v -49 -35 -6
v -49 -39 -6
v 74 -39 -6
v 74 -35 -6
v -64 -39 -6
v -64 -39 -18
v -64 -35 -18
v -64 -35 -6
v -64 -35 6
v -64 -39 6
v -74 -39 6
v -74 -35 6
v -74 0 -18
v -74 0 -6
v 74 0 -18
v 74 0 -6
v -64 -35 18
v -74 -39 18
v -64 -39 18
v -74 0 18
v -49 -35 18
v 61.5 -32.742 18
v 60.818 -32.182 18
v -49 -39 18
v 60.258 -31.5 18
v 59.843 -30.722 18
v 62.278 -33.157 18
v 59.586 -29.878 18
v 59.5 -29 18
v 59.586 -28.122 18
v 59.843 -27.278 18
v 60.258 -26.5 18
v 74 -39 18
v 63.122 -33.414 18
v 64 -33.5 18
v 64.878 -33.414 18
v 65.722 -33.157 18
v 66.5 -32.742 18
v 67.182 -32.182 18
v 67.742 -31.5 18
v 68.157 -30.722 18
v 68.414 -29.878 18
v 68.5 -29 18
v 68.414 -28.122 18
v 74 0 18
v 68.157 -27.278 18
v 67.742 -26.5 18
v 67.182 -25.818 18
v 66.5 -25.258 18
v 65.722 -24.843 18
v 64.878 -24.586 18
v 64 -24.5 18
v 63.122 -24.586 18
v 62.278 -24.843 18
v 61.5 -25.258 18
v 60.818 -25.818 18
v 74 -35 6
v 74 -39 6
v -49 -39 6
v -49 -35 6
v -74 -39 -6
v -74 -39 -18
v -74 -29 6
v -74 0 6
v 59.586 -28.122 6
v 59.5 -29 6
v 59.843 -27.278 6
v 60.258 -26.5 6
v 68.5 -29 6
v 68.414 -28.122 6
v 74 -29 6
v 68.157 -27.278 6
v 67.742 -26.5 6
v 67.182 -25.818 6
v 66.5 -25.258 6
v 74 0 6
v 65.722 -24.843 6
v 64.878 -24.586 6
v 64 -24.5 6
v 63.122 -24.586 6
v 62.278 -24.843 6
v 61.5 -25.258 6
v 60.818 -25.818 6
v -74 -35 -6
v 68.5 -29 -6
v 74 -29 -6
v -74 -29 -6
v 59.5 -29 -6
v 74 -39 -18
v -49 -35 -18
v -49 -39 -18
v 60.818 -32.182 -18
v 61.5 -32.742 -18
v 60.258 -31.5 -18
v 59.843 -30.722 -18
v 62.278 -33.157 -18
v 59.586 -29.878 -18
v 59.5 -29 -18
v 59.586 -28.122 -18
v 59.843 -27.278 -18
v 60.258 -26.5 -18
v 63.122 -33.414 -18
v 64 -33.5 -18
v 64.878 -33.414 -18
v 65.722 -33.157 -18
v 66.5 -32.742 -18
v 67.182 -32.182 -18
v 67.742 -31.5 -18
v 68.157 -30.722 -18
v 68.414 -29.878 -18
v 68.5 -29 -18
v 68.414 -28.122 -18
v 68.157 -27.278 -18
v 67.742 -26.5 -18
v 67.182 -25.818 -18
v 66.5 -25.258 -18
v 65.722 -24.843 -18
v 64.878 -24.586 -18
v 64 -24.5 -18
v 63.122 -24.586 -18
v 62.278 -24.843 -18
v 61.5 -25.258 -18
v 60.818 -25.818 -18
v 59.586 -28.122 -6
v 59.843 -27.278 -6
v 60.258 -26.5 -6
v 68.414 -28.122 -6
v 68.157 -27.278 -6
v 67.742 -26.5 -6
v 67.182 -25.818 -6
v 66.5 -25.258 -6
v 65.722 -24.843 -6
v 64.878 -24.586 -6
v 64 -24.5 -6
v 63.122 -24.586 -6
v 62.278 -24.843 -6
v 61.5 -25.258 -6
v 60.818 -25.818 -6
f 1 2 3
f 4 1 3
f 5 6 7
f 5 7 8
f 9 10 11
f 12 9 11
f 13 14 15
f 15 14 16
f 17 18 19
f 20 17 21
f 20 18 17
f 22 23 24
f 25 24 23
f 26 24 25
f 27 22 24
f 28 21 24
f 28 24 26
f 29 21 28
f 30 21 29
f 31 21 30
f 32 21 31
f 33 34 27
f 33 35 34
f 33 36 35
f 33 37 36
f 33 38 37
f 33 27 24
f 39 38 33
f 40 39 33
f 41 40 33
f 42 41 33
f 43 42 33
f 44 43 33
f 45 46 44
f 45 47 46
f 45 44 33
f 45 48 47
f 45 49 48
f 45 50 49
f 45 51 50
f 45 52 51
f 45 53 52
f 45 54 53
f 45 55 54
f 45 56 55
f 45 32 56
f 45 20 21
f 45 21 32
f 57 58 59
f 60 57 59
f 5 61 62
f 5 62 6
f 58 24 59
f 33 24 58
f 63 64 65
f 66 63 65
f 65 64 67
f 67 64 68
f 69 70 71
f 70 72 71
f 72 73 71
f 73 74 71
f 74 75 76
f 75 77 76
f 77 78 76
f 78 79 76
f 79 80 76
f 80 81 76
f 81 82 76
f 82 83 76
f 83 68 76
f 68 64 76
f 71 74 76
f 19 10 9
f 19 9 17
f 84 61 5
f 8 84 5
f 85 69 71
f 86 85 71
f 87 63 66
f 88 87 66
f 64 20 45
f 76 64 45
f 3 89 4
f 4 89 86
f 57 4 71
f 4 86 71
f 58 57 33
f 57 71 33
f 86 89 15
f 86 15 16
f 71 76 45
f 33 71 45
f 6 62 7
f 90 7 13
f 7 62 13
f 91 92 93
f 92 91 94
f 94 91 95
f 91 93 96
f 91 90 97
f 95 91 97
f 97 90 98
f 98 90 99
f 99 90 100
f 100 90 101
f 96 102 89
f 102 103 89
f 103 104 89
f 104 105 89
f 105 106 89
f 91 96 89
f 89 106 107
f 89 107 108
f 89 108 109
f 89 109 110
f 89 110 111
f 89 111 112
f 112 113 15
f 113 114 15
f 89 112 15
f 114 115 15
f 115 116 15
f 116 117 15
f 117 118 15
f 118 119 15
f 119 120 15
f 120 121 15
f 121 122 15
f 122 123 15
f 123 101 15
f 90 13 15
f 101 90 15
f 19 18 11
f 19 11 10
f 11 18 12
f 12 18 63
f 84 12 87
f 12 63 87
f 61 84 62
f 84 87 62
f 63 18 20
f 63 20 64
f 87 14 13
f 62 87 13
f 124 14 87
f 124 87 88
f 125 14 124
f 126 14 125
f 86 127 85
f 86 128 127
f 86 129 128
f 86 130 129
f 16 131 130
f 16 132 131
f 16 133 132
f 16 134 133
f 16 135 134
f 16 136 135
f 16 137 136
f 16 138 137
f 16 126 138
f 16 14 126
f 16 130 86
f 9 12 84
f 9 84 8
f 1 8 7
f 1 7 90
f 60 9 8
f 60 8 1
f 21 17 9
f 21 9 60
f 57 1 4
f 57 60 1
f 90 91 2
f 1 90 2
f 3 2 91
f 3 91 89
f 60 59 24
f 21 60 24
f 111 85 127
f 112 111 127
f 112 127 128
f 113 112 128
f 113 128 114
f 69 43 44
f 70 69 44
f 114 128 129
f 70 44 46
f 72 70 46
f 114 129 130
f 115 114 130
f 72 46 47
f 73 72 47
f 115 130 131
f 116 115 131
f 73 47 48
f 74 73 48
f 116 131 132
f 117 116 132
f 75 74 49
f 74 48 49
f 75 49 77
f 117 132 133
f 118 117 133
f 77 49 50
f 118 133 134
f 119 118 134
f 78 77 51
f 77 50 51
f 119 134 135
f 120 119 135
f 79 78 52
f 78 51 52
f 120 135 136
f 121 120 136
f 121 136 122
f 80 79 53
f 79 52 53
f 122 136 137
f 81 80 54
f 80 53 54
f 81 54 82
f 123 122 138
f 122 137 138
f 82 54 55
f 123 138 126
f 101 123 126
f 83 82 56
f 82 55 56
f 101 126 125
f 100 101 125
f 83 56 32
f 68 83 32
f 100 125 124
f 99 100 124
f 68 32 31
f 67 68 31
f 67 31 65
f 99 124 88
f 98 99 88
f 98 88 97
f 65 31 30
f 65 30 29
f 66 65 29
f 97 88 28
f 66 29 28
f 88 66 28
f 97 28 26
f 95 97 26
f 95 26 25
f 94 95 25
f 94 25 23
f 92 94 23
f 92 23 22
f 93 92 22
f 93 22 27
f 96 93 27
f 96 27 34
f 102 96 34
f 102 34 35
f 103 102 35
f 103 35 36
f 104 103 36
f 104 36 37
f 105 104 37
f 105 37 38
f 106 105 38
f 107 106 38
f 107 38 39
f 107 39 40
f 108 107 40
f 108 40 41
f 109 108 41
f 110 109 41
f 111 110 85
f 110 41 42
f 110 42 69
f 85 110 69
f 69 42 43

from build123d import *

# Parameters (mm, degrees)
F0_W     = 148
F0_H     = 12
F1_DEPTH = 39
F2_DEPTH = 29
F3_W     = 123
F3_H     = 12
F3_W_2   = 15
F3_W_3   = 10
F4_DEPTH = 4
F5_R     = 4.5
F6_DEPTH = 36


with BuildPart() as f1:
    # F0 (on Front) → F1 (new body)
    with BuildSketch(Plane.XZ):
        with Locations((0, 12)):
            Rectangle(F0_W, F0_H)
        with Locations((0, -12)):
            Rectangle(F0_W, F0_H)
        Rectangle(F0_W, F0_H)
    extrude(amount=F1_DEPTH)

    # F0 (on Front) → F2 (cut)
    with BuildSketch(Plane.XZ):
        Rectangle(F0_W, F0_H)
    extrude(amount=F2_DEPTH, mode=Mode.SUBTRACT)

    # F3 (on face) → F4 (cut)
    with BuildSketch(Plane.XZ.offset(39)):
        with Locations((12.5, 0)):
            Rectangle(F3_W, F3_H)
        with Locations((-56.5, 0)):
            Rectangle(F3_W_2, F3_H)
        with Locations((-69, 0)):
            Rectangle(F3_W_3, F3_H)
        with Locations((-56.5, 12)):
            Rectangle(F3_W_2, F3_H)
        with Locations((-56.5, -12)):
            Rectangle(F3_W_2, F3_H)
    extrude(amount=-F4_DEPTH, mode=Mode.SUBTRACT)

    # F5 (on face) → F6 (cut)
    with BuildSketch(Plane.XY.offset(18)):
        with Locations((64, -29)):
            Circle(F5_R)
    extrude(amount=-F6_DEPTH, mode=Mode.SUBTRACT)


solid = f1.part
